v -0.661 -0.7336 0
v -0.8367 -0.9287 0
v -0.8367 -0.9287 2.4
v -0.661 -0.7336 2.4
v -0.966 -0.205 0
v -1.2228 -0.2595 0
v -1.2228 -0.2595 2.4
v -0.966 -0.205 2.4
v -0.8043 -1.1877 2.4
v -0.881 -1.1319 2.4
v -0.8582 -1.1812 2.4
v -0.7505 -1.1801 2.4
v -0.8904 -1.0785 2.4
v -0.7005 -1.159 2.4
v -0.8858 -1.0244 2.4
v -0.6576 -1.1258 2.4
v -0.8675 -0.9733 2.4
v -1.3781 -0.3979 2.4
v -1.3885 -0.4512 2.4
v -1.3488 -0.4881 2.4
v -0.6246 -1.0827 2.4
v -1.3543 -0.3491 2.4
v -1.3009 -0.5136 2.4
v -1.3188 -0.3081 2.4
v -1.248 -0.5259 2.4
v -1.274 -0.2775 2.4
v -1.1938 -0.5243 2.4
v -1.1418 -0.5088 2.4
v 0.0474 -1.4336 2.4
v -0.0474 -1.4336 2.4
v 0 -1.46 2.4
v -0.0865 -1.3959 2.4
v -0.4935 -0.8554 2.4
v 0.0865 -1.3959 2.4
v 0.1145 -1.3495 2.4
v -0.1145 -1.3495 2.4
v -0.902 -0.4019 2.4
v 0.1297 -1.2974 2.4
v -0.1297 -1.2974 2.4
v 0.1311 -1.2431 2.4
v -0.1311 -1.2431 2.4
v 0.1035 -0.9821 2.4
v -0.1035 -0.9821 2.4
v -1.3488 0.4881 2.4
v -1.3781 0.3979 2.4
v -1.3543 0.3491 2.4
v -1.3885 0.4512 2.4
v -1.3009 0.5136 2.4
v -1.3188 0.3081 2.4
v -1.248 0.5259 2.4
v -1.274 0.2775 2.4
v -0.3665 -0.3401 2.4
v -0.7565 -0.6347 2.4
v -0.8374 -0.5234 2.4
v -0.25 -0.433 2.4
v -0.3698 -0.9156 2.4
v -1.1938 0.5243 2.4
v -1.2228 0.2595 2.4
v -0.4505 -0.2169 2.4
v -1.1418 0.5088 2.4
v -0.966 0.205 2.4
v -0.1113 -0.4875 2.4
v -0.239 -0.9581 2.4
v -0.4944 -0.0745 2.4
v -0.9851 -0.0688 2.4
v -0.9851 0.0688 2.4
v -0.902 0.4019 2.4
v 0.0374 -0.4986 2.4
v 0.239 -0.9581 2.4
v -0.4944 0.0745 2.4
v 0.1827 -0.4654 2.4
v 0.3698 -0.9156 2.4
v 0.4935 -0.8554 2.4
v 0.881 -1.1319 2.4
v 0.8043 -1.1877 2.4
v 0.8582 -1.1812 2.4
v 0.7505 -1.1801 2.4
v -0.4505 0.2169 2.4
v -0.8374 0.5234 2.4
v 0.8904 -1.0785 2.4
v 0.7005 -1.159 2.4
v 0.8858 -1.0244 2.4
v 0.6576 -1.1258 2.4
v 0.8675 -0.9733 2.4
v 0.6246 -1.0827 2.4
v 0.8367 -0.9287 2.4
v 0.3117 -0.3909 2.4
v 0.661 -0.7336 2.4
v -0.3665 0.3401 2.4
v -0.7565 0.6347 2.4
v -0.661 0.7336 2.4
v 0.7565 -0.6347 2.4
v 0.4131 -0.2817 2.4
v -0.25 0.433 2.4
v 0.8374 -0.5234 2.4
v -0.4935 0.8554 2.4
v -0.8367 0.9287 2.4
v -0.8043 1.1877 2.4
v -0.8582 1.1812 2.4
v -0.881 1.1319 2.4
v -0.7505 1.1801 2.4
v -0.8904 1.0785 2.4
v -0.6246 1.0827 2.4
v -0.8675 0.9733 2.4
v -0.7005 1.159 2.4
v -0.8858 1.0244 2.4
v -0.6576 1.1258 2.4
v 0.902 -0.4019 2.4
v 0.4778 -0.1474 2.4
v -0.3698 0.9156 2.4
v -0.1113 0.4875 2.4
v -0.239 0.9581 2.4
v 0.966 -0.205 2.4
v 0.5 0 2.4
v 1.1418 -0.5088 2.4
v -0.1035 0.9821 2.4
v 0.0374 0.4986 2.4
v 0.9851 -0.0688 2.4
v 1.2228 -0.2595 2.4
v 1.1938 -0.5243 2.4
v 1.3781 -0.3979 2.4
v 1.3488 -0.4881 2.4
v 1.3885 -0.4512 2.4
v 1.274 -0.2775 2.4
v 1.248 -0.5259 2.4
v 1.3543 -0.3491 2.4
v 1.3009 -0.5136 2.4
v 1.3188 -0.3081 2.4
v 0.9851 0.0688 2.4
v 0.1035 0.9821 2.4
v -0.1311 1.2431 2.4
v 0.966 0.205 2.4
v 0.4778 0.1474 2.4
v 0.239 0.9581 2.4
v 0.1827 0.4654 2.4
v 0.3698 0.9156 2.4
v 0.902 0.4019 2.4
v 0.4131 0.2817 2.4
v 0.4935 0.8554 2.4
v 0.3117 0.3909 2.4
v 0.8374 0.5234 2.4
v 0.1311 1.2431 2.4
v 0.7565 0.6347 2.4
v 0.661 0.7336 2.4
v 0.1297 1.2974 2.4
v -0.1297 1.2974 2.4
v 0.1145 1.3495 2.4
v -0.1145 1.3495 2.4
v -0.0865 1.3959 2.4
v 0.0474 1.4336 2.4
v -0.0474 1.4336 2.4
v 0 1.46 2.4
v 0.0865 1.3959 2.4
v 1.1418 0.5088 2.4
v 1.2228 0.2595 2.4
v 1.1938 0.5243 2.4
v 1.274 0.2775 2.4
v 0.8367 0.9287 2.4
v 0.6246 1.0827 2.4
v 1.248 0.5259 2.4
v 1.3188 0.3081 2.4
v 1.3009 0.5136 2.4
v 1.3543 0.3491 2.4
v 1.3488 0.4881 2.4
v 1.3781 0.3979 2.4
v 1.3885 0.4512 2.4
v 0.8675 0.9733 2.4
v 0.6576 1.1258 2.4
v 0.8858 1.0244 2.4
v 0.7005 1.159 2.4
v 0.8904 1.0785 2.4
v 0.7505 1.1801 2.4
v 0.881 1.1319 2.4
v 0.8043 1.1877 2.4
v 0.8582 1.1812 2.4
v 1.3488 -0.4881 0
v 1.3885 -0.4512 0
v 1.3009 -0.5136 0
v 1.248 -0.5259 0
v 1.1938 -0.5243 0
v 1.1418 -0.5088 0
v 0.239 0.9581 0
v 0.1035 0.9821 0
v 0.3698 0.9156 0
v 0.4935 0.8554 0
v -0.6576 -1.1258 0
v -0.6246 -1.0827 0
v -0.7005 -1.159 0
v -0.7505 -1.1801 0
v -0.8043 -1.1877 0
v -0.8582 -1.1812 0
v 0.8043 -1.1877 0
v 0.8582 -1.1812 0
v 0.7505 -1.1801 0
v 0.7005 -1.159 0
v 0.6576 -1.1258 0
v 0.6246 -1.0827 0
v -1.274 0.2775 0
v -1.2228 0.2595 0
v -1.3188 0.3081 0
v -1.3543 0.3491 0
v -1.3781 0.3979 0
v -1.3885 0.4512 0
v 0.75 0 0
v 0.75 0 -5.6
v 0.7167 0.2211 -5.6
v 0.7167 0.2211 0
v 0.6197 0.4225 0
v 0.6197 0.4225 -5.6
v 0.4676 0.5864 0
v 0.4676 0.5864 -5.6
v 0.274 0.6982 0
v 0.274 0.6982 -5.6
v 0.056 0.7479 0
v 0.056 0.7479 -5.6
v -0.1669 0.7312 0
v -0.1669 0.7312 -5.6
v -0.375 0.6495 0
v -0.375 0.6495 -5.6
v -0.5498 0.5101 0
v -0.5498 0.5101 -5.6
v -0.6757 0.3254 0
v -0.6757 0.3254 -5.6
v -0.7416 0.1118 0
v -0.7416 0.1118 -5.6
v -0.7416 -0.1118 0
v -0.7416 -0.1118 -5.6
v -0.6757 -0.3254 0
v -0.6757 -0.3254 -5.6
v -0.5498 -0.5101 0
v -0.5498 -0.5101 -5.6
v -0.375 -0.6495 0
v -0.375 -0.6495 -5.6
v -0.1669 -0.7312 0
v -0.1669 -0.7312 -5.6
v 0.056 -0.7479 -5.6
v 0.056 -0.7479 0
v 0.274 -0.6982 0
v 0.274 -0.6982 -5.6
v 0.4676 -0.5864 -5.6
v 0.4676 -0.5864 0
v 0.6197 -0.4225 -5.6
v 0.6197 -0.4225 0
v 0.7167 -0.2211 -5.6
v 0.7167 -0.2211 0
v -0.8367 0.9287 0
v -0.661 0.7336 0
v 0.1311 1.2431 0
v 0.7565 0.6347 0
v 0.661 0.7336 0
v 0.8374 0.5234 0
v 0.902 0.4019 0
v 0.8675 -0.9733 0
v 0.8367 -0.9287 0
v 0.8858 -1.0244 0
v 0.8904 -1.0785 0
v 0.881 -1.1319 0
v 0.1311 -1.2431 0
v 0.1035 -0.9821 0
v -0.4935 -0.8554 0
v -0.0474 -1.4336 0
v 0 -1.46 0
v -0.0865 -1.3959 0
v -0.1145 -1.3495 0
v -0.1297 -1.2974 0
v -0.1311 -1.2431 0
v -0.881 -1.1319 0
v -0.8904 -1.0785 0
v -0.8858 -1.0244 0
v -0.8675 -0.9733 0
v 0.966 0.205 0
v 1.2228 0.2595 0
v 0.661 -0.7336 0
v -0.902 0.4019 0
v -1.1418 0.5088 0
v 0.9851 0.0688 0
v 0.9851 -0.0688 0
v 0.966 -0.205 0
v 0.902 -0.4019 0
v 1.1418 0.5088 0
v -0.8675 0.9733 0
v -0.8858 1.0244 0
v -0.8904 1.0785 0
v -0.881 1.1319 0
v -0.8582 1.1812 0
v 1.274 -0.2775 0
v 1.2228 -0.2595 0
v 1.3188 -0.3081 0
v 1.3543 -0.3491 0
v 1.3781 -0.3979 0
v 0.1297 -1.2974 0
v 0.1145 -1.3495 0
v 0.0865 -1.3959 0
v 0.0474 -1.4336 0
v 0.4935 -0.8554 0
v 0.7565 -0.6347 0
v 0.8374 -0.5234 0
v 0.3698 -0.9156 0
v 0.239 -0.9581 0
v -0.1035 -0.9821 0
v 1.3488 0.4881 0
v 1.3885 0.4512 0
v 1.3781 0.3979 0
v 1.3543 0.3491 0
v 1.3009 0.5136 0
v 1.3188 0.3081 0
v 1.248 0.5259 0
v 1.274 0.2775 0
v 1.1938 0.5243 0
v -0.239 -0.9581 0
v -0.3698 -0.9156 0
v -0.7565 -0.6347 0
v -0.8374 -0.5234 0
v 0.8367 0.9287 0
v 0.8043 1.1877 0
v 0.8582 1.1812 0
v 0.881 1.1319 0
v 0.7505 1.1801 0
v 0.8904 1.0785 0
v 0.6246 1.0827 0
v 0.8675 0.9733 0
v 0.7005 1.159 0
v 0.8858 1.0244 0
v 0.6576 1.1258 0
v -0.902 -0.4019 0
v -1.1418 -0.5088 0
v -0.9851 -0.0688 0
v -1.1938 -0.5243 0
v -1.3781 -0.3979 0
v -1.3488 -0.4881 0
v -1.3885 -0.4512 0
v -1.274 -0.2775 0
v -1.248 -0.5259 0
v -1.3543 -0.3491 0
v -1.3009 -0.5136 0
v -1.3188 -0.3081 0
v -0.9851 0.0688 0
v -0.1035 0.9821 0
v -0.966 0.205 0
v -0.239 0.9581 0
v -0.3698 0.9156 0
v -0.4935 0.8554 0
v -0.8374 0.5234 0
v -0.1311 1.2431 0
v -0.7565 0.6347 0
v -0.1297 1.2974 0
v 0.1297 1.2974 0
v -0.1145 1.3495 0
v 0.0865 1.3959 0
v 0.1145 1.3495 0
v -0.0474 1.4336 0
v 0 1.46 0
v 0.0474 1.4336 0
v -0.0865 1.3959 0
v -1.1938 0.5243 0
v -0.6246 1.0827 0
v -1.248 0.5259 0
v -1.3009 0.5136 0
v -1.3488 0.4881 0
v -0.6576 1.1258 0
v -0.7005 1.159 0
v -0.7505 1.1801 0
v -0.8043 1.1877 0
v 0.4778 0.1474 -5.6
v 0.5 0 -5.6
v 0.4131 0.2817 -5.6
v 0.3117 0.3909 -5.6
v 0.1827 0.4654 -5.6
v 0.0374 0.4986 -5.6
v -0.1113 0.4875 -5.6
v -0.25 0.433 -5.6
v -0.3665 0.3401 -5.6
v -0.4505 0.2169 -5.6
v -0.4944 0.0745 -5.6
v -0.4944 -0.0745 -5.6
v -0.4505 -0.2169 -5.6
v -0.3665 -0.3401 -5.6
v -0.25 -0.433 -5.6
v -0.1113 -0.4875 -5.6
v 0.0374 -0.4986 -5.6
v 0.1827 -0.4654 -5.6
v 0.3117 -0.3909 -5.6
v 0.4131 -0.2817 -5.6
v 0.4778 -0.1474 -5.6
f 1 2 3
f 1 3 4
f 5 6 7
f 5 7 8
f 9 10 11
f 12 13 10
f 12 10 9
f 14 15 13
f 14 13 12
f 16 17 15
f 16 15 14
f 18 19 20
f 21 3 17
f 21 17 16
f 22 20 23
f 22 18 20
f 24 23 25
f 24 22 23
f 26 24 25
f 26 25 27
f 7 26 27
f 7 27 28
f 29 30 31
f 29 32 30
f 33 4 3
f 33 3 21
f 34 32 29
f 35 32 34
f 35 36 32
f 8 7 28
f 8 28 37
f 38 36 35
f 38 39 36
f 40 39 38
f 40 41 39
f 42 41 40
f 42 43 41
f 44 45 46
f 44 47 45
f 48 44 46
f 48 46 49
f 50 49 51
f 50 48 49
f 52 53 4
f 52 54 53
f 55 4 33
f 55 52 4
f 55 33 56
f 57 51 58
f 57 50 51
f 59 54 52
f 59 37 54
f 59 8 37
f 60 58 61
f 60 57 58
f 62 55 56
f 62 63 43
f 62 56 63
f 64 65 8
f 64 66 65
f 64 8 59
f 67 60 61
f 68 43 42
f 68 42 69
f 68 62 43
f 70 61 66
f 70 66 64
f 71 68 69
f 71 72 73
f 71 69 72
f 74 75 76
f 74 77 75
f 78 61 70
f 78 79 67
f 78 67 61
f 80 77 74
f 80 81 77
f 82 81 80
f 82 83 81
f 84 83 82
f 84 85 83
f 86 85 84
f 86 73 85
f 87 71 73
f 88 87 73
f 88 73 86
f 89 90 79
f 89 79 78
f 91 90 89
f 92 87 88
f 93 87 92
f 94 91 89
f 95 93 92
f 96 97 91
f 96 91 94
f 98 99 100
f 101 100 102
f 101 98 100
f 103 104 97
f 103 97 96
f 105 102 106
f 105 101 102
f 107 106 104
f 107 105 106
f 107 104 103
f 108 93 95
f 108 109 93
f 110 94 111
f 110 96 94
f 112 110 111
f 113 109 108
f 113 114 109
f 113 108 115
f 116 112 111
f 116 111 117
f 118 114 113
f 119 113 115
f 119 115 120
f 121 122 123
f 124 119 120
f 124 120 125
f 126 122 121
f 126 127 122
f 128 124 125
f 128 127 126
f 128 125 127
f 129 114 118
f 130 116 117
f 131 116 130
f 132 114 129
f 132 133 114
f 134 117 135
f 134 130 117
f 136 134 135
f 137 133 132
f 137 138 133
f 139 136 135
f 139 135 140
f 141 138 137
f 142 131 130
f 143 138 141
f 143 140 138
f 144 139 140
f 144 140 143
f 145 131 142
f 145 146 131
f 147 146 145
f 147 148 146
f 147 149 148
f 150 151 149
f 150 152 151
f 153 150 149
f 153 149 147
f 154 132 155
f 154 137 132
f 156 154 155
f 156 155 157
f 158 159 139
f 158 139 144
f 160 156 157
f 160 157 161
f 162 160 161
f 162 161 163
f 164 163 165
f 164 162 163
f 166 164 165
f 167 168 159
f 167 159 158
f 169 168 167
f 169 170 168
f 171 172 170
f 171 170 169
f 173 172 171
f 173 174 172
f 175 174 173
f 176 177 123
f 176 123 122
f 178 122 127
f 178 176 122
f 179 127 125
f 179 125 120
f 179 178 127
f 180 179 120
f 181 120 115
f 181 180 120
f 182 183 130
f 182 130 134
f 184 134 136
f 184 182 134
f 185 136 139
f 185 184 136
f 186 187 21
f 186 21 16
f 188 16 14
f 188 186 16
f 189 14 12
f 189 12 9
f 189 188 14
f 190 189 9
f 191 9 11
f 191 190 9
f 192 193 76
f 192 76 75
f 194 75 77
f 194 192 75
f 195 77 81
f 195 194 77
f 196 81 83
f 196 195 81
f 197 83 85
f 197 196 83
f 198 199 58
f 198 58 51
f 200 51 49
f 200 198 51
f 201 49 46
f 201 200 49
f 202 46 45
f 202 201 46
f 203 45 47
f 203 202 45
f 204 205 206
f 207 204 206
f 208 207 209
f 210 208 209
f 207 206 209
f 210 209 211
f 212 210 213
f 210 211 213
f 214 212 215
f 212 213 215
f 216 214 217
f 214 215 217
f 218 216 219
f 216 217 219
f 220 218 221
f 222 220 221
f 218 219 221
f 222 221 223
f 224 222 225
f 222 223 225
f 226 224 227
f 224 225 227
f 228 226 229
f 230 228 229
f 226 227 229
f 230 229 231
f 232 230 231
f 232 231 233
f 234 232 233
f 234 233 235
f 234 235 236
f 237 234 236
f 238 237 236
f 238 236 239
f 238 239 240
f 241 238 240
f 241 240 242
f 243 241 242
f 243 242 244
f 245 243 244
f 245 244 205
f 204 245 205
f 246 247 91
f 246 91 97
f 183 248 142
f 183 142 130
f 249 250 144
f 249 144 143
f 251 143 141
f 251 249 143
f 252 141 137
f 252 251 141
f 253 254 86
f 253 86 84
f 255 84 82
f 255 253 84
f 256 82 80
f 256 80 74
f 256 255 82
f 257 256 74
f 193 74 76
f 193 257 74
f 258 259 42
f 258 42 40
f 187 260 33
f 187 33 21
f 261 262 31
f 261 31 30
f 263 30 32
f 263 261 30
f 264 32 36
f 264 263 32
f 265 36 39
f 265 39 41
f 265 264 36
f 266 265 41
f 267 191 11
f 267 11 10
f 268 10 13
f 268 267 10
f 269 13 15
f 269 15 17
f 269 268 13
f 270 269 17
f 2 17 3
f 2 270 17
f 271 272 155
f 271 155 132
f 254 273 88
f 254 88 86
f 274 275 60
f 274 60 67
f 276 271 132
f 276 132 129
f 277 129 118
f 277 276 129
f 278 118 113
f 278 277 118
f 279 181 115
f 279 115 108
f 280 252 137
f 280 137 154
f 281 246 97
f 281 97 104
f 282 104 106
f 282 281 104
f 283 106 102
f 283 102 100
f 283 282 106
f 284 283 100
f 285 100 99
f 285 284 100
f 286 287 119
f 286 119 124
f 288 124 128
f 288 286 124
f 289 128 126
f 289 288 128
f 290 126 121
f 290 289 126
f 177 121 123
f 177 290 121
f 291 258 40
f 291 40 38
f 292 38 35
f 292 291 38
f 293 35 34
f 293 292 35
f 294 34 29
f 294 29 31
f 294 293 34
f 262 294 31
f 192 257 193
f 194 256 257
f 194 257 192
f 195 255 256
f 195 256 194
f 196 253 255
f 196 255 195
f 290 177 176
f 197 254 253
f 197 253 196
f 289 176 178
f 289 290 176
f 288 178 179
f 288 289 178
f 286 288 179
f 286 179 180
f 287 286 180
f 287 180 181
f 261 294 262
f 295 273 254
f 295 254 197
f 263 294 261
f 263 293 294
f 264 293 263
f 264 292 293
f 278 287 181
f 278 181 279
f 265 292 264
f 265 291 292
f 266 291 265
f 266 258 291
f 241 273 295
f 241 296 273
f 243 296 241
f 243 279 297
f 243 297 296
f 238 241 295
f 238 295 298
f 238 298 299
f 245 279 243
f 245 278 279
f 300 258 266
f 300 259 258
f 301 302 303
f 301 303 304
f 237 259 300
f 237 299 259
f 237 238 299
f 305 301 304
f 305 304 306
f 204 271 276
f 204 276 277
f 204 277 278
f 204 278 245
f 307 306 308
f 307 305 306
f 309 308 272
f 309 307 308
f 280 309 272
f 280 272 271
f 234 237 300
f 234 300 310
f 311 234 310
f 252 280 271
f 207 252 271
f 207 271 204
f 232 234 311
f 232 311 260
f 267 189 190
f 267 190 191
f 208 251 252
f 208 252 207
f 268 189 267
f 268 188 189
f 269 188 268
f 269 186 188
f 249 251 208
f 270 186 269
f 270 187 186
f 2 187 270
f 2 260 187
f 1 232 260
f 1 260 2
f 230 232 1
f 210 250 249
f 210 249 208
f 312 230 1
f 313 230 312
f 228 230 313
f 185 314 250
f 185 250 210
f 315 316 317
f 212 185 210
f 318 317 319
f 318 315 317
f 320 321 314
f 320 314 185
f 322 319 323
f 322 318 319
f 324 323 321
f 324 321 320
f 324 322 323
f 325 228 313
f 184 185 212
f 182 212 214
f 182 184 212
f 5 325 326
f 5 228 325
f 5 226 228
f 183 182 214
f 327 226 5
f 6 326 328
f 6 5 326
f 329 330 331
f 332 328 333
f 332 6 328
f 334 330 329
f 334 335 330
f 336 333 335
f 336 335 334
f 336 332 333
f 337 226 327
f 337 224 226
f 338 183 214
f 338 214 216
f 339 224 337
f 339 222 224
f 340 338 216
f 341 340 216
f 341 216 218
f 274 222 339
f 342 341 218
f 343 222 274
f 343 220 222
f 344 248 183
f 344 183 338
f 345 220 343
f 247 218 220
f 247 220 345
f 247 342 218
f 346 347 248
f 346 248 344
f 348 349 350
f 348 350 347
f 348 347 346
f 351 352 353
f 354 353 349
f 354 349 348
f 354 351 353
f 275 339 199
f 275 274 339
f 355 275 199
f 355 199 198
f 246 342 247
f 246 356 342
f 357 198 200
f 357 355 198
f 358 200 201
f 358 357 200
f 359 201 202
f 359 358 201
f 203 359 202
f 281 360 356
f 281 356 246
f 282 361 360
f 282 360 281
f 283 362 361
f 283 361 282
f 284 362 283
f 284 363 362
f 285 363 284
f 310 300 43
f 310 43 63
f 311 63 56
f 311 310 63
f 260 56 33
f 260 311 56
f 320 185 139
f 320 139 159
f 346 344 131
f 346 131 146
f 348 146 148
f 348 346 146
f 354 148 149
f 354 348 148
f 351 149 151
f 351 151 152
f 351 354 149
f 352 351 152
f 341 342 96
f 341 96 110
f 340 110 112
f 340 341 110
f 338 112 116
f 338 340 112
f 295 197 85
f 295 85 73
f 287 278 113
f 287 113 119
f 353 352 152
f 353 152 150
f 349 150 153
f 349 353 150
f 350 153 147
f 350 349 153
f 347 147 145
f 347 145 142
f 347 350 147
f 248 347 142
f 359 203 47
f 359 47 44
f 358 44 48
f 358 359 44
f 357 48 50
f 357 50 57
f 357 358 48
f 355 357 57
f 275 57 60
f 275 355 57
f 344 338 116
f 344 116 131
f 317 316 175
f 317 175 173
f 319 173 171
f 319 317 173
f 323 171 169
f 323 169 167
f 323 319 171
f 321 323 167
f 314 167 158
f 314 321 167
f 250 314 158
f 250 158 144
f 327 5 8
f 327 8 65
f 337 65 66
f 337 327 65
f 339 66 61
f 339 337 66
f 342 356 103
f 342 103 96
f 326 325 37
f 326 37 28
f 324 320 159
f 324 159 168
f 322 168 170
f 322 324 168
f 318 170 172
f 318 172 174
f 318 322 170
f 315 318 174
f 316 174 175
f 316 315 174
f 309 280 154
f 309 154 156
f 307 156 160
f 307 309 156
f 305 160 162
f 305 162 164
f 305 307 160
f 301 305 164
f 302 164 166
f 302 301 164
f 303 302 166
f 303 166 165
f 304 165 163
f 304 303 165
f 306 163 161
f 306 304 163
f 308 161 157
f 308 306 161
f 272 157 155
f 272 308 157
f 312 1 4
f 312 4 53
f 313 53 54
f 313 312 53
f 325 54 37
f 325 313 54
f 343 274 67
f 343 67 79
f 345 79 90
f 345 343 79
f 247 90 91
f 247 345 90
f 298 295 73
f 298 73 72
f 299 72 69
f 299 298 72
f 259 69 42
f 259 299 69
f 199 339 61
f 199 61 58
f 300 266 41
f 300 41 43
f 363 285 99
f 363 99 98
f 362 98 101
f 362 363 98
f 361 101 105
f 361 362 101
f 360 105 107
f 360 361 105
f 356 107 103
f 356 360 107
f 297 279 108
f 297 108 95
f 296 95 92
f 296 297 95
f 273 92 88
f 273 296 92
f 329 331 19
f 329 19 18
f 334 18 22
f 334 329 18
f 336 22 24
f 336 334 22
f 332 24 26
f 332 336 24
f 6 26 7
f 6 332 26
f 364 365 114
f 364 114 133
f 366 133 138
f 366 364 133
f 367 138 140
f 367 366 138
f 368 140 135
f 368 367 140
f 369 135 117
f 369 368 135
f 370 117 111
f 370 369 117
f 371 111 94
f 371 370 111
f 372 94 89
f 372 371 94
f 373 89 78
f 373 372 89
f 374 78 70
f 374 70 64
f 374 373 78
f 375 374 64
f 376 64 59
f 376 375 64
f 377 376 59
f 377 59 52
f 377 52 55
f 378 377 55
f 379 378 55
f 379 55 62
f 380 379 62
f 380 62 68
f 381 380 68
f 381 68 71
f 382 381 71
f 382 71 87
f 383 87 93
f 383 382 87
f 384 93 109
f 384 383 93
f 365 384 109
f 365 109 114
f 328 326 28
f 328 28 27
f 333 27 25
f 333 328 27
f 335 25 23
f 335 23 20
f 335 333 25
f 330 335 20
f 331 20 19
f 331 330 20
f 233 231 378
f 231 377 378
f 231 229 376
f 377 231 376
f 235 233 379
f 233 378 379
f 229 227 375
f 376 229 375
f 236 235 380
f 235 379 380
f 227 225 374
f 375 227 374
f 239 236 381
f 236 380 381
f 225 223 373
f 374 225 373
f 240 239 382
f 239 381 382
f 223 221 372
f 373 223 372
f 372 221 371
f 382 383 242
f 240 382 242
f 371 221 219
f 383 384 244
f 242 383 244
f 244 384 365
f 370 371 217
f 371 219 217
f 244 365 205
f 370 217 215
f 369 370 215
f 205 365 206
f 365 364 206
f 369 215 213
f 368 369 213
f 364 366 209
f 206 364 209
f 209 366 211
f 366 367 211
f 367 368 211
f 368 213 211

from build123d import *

# Parameters (mm, degrees)
SKETCH1_R           = 0.75
BOSS_EXTRUDE1_DEPTH = 2.4
BOSS_EXTRUDE2_START = -8
SKETCH2_R           = 0.75
SKETCH2_R_2         = 0.5
BOSS_EXTRUDE2_DEPTH = 8


with BuildPart() as part:
    # Sketch1 → Boss-Extrude1 (new body)
    with BuildSketch(Plane.XY):
        with BuildLine():
            Line((-0.103544507, 0.982056406), (-0.131068996, 1.243109375))
            ThreePointArc((-0.131068996, 1.243109375), (-0.10199222, 1.373586424), (0, 1.46))
            ThreePointArc((0, 1.46), (0.10199222, 1.373586424), (0.131068996, 1.243109375))
            Line((0.131068996, 1.243109375), (0.103544507, 0.982056406))
            ThreePointArc((0.103544507, 0.982056406), (0.305154282, 0.93916831), (0.493469007, 0.855362256))
            Line((0.493469007, 0.855362256), (0.624644312, 1.082737033))
            ThreePointArc((0.624644312, 1.082737033), (0.724860403, 1.171204283), (0.858166468, 1.181164812))
            ThreePointArc((0.858166468, 1.181164812), (0.889887282, 1.051305237), (0.836718403, 0.928656187))
            Line((0.836718403, 0.928656187), (0.661007538, 0.733638388))
            ThreePointArc((0.661007538, 0.733638388), (0.798904282, 0.580437937), (0.901994132, 0.401948797))
            Line((0.901994132, 0.401948797), (1.141764724, 0.508795946))
            ThreePointArc((1.141764724, 0.508795946), (1.27484099, 0.521461914), (1.388542514, 0.451164812))
            ThreePointArc((1.388542514, 0.451164812), (1.337875649, 0.327461182), (1.222769819, 0.2594879))
            Line((1.222769819, 0.2594879), (0.965988157, 0.204995441))
            ThreePointArc((0.965988157, 0.204995441), (0.9875, 0), (0.965988157, -0.204995441))
            Line((0.965988157, -0.204995441), (1.222769819, -0.2594879))
            ThreePointArc((1.222769819, -0.2594879), (1.337875649, -0.327461182), (1.388542514, -0.451164812))
            ThreePointArc((1.388542514, -0.451164812), (1.27484099, -0.521461914), (1.141764724, -0.508795946))
            Line((1.141764724, -0.508795946), (0.901994132, -0.401948797))
            ThreePointArc((0.901994132, -0.401948797), (0.798904282, -0.580437937), (0.661007538, -0.733638388))
            Line((0.661007538, -0.733638388), (0.836718403, -0.928656187))
            ThreePointArc((0.836718403, -0.928656187), (0.889887282, -1.051305237), (0.858166468, -1.181164812))
            ThreePointArc((0.858166468, -1.181164812), (0.724860403, -1.171204283), (0.624644312, -1.082737033))
            Line((0.624644312, -1.082737033), (0.493469007, -0.855362256))
            ThreePointArc((0.493469007, -0.855362256), (0.305154282, -0.93916831), (0.103544507, -0.982056406))
            Line((0.103544507, -0.982056406), (0.131068996, -1.243109375))
            ThreePointArc((0.131068996, -1.243109375), (0.10199222, -1.373586424), (0, -1.46))
            ThreePointArc((0, -1.46), (-0.10199222, -1.373586424), (-0.131068996, -1.243109375))
            Line((-0.131068996, -1.243109375), (-0.103544507, -0.982056406))
            ThreePointArc((-0.103544507, -0.982056406), (-0.305154282, -0.93916831), (-0.493469007, -0.855362256))
            Line((-0.493469007, -0.855362256), (-0.624644312, -1.082737033))
            ThreePointArc((-0.624644312, -1.082737033), (-0.724860403, -1.171204283), (-0.858166468, -1.181164812))
            ThreePointArc((-0.858166468, -1.181164812), (-0.889887282, -1.051305237), (-0.836718403, -0.928656187))
            Line((-0.836718403, -0.928656187), (-0.661007538, -0.733638388))
            ThreePointArc((-0.661007538, -0.733638388), (-0.798904282, -0.580437937), (-0.901994132, -0.401948797))
            Line((-0.901994132, -0.401948797), (-1.141764724, -0.508795946))
            ThreePointArc((-1.141764724, -0.508795946), (-1.27484099, -0.521461914), (-1.388542514, -0.451164812))
            ThreePointArc((-1.388542514, -0.451164812), (-1.337875649, -0.327461182), (-1.222769819, -0.2594879))
            Line((-1.222769819, -0.2594879), (-0.965988157, -0.204995441))
            ThreePointArc((-0.965988157, -0.204995441), (-0.9875, 0), (-0.965988157, 0.204995441))
            Line((-0.965988157, 0.204995441), (-1.222769819, 0.2594879))
            ThreePointArc((-1.222769819, 0.2594879), (-1.337875649, 0.327461182), (-1.388542514, 0.451164812))
            ThreePointArc((-1.388542514, 0.451164812), (-1.27484099, 0.521461914), (-1.141764724, 0.508795946))
            Line((-1.141764724, 0.508795946), (-0.901994132, 0.401948797))
            ThreePointArc((-0.901994132, 0.401948797), (-0.798904282, 0.580437937), (-0.661007538, 0.733638388))
            Line((-0.661007538, 0.733638388), (-0.836718403, 0.928656187))
            ThreePointArc((-0.836718403, 0.928656187), (-0.889887282, 1.051305237), (-0.858166468, 1.181164812))
            ThreePointArc((-0.858166468, 1.181164812), (-0.724860403, 1.171204283), (-0.624644312, 1.082737033))
            Line((-0.624644312, 1.082737033), (-0.493469007, 0.855362256))
            ThreePointArc((-0.493469007, 0.855362256), (-0.305154282, 0.93916831), (-0.103544507, 0.982056406))
        make_face()
        Circle(SKETCH1_R, mode=Mode.SUBTRACT)
    extrude(amount=BOSS_EXTRUDE1_DEPTH)

    # Sketch2 → Boss-Extrude2 (add)
    with BuildSketch(Plane.XY.offset(2.4).offset(BOSS_EXTRUDE2_START)):
        Circle(SKETCH2_R)
        Circle(SKETCH2_R_2, mode=Mode.SUBTRACT)
    extrude(amount=BOSS_EXTRUDE2_DEPTH)


solid = part.part
